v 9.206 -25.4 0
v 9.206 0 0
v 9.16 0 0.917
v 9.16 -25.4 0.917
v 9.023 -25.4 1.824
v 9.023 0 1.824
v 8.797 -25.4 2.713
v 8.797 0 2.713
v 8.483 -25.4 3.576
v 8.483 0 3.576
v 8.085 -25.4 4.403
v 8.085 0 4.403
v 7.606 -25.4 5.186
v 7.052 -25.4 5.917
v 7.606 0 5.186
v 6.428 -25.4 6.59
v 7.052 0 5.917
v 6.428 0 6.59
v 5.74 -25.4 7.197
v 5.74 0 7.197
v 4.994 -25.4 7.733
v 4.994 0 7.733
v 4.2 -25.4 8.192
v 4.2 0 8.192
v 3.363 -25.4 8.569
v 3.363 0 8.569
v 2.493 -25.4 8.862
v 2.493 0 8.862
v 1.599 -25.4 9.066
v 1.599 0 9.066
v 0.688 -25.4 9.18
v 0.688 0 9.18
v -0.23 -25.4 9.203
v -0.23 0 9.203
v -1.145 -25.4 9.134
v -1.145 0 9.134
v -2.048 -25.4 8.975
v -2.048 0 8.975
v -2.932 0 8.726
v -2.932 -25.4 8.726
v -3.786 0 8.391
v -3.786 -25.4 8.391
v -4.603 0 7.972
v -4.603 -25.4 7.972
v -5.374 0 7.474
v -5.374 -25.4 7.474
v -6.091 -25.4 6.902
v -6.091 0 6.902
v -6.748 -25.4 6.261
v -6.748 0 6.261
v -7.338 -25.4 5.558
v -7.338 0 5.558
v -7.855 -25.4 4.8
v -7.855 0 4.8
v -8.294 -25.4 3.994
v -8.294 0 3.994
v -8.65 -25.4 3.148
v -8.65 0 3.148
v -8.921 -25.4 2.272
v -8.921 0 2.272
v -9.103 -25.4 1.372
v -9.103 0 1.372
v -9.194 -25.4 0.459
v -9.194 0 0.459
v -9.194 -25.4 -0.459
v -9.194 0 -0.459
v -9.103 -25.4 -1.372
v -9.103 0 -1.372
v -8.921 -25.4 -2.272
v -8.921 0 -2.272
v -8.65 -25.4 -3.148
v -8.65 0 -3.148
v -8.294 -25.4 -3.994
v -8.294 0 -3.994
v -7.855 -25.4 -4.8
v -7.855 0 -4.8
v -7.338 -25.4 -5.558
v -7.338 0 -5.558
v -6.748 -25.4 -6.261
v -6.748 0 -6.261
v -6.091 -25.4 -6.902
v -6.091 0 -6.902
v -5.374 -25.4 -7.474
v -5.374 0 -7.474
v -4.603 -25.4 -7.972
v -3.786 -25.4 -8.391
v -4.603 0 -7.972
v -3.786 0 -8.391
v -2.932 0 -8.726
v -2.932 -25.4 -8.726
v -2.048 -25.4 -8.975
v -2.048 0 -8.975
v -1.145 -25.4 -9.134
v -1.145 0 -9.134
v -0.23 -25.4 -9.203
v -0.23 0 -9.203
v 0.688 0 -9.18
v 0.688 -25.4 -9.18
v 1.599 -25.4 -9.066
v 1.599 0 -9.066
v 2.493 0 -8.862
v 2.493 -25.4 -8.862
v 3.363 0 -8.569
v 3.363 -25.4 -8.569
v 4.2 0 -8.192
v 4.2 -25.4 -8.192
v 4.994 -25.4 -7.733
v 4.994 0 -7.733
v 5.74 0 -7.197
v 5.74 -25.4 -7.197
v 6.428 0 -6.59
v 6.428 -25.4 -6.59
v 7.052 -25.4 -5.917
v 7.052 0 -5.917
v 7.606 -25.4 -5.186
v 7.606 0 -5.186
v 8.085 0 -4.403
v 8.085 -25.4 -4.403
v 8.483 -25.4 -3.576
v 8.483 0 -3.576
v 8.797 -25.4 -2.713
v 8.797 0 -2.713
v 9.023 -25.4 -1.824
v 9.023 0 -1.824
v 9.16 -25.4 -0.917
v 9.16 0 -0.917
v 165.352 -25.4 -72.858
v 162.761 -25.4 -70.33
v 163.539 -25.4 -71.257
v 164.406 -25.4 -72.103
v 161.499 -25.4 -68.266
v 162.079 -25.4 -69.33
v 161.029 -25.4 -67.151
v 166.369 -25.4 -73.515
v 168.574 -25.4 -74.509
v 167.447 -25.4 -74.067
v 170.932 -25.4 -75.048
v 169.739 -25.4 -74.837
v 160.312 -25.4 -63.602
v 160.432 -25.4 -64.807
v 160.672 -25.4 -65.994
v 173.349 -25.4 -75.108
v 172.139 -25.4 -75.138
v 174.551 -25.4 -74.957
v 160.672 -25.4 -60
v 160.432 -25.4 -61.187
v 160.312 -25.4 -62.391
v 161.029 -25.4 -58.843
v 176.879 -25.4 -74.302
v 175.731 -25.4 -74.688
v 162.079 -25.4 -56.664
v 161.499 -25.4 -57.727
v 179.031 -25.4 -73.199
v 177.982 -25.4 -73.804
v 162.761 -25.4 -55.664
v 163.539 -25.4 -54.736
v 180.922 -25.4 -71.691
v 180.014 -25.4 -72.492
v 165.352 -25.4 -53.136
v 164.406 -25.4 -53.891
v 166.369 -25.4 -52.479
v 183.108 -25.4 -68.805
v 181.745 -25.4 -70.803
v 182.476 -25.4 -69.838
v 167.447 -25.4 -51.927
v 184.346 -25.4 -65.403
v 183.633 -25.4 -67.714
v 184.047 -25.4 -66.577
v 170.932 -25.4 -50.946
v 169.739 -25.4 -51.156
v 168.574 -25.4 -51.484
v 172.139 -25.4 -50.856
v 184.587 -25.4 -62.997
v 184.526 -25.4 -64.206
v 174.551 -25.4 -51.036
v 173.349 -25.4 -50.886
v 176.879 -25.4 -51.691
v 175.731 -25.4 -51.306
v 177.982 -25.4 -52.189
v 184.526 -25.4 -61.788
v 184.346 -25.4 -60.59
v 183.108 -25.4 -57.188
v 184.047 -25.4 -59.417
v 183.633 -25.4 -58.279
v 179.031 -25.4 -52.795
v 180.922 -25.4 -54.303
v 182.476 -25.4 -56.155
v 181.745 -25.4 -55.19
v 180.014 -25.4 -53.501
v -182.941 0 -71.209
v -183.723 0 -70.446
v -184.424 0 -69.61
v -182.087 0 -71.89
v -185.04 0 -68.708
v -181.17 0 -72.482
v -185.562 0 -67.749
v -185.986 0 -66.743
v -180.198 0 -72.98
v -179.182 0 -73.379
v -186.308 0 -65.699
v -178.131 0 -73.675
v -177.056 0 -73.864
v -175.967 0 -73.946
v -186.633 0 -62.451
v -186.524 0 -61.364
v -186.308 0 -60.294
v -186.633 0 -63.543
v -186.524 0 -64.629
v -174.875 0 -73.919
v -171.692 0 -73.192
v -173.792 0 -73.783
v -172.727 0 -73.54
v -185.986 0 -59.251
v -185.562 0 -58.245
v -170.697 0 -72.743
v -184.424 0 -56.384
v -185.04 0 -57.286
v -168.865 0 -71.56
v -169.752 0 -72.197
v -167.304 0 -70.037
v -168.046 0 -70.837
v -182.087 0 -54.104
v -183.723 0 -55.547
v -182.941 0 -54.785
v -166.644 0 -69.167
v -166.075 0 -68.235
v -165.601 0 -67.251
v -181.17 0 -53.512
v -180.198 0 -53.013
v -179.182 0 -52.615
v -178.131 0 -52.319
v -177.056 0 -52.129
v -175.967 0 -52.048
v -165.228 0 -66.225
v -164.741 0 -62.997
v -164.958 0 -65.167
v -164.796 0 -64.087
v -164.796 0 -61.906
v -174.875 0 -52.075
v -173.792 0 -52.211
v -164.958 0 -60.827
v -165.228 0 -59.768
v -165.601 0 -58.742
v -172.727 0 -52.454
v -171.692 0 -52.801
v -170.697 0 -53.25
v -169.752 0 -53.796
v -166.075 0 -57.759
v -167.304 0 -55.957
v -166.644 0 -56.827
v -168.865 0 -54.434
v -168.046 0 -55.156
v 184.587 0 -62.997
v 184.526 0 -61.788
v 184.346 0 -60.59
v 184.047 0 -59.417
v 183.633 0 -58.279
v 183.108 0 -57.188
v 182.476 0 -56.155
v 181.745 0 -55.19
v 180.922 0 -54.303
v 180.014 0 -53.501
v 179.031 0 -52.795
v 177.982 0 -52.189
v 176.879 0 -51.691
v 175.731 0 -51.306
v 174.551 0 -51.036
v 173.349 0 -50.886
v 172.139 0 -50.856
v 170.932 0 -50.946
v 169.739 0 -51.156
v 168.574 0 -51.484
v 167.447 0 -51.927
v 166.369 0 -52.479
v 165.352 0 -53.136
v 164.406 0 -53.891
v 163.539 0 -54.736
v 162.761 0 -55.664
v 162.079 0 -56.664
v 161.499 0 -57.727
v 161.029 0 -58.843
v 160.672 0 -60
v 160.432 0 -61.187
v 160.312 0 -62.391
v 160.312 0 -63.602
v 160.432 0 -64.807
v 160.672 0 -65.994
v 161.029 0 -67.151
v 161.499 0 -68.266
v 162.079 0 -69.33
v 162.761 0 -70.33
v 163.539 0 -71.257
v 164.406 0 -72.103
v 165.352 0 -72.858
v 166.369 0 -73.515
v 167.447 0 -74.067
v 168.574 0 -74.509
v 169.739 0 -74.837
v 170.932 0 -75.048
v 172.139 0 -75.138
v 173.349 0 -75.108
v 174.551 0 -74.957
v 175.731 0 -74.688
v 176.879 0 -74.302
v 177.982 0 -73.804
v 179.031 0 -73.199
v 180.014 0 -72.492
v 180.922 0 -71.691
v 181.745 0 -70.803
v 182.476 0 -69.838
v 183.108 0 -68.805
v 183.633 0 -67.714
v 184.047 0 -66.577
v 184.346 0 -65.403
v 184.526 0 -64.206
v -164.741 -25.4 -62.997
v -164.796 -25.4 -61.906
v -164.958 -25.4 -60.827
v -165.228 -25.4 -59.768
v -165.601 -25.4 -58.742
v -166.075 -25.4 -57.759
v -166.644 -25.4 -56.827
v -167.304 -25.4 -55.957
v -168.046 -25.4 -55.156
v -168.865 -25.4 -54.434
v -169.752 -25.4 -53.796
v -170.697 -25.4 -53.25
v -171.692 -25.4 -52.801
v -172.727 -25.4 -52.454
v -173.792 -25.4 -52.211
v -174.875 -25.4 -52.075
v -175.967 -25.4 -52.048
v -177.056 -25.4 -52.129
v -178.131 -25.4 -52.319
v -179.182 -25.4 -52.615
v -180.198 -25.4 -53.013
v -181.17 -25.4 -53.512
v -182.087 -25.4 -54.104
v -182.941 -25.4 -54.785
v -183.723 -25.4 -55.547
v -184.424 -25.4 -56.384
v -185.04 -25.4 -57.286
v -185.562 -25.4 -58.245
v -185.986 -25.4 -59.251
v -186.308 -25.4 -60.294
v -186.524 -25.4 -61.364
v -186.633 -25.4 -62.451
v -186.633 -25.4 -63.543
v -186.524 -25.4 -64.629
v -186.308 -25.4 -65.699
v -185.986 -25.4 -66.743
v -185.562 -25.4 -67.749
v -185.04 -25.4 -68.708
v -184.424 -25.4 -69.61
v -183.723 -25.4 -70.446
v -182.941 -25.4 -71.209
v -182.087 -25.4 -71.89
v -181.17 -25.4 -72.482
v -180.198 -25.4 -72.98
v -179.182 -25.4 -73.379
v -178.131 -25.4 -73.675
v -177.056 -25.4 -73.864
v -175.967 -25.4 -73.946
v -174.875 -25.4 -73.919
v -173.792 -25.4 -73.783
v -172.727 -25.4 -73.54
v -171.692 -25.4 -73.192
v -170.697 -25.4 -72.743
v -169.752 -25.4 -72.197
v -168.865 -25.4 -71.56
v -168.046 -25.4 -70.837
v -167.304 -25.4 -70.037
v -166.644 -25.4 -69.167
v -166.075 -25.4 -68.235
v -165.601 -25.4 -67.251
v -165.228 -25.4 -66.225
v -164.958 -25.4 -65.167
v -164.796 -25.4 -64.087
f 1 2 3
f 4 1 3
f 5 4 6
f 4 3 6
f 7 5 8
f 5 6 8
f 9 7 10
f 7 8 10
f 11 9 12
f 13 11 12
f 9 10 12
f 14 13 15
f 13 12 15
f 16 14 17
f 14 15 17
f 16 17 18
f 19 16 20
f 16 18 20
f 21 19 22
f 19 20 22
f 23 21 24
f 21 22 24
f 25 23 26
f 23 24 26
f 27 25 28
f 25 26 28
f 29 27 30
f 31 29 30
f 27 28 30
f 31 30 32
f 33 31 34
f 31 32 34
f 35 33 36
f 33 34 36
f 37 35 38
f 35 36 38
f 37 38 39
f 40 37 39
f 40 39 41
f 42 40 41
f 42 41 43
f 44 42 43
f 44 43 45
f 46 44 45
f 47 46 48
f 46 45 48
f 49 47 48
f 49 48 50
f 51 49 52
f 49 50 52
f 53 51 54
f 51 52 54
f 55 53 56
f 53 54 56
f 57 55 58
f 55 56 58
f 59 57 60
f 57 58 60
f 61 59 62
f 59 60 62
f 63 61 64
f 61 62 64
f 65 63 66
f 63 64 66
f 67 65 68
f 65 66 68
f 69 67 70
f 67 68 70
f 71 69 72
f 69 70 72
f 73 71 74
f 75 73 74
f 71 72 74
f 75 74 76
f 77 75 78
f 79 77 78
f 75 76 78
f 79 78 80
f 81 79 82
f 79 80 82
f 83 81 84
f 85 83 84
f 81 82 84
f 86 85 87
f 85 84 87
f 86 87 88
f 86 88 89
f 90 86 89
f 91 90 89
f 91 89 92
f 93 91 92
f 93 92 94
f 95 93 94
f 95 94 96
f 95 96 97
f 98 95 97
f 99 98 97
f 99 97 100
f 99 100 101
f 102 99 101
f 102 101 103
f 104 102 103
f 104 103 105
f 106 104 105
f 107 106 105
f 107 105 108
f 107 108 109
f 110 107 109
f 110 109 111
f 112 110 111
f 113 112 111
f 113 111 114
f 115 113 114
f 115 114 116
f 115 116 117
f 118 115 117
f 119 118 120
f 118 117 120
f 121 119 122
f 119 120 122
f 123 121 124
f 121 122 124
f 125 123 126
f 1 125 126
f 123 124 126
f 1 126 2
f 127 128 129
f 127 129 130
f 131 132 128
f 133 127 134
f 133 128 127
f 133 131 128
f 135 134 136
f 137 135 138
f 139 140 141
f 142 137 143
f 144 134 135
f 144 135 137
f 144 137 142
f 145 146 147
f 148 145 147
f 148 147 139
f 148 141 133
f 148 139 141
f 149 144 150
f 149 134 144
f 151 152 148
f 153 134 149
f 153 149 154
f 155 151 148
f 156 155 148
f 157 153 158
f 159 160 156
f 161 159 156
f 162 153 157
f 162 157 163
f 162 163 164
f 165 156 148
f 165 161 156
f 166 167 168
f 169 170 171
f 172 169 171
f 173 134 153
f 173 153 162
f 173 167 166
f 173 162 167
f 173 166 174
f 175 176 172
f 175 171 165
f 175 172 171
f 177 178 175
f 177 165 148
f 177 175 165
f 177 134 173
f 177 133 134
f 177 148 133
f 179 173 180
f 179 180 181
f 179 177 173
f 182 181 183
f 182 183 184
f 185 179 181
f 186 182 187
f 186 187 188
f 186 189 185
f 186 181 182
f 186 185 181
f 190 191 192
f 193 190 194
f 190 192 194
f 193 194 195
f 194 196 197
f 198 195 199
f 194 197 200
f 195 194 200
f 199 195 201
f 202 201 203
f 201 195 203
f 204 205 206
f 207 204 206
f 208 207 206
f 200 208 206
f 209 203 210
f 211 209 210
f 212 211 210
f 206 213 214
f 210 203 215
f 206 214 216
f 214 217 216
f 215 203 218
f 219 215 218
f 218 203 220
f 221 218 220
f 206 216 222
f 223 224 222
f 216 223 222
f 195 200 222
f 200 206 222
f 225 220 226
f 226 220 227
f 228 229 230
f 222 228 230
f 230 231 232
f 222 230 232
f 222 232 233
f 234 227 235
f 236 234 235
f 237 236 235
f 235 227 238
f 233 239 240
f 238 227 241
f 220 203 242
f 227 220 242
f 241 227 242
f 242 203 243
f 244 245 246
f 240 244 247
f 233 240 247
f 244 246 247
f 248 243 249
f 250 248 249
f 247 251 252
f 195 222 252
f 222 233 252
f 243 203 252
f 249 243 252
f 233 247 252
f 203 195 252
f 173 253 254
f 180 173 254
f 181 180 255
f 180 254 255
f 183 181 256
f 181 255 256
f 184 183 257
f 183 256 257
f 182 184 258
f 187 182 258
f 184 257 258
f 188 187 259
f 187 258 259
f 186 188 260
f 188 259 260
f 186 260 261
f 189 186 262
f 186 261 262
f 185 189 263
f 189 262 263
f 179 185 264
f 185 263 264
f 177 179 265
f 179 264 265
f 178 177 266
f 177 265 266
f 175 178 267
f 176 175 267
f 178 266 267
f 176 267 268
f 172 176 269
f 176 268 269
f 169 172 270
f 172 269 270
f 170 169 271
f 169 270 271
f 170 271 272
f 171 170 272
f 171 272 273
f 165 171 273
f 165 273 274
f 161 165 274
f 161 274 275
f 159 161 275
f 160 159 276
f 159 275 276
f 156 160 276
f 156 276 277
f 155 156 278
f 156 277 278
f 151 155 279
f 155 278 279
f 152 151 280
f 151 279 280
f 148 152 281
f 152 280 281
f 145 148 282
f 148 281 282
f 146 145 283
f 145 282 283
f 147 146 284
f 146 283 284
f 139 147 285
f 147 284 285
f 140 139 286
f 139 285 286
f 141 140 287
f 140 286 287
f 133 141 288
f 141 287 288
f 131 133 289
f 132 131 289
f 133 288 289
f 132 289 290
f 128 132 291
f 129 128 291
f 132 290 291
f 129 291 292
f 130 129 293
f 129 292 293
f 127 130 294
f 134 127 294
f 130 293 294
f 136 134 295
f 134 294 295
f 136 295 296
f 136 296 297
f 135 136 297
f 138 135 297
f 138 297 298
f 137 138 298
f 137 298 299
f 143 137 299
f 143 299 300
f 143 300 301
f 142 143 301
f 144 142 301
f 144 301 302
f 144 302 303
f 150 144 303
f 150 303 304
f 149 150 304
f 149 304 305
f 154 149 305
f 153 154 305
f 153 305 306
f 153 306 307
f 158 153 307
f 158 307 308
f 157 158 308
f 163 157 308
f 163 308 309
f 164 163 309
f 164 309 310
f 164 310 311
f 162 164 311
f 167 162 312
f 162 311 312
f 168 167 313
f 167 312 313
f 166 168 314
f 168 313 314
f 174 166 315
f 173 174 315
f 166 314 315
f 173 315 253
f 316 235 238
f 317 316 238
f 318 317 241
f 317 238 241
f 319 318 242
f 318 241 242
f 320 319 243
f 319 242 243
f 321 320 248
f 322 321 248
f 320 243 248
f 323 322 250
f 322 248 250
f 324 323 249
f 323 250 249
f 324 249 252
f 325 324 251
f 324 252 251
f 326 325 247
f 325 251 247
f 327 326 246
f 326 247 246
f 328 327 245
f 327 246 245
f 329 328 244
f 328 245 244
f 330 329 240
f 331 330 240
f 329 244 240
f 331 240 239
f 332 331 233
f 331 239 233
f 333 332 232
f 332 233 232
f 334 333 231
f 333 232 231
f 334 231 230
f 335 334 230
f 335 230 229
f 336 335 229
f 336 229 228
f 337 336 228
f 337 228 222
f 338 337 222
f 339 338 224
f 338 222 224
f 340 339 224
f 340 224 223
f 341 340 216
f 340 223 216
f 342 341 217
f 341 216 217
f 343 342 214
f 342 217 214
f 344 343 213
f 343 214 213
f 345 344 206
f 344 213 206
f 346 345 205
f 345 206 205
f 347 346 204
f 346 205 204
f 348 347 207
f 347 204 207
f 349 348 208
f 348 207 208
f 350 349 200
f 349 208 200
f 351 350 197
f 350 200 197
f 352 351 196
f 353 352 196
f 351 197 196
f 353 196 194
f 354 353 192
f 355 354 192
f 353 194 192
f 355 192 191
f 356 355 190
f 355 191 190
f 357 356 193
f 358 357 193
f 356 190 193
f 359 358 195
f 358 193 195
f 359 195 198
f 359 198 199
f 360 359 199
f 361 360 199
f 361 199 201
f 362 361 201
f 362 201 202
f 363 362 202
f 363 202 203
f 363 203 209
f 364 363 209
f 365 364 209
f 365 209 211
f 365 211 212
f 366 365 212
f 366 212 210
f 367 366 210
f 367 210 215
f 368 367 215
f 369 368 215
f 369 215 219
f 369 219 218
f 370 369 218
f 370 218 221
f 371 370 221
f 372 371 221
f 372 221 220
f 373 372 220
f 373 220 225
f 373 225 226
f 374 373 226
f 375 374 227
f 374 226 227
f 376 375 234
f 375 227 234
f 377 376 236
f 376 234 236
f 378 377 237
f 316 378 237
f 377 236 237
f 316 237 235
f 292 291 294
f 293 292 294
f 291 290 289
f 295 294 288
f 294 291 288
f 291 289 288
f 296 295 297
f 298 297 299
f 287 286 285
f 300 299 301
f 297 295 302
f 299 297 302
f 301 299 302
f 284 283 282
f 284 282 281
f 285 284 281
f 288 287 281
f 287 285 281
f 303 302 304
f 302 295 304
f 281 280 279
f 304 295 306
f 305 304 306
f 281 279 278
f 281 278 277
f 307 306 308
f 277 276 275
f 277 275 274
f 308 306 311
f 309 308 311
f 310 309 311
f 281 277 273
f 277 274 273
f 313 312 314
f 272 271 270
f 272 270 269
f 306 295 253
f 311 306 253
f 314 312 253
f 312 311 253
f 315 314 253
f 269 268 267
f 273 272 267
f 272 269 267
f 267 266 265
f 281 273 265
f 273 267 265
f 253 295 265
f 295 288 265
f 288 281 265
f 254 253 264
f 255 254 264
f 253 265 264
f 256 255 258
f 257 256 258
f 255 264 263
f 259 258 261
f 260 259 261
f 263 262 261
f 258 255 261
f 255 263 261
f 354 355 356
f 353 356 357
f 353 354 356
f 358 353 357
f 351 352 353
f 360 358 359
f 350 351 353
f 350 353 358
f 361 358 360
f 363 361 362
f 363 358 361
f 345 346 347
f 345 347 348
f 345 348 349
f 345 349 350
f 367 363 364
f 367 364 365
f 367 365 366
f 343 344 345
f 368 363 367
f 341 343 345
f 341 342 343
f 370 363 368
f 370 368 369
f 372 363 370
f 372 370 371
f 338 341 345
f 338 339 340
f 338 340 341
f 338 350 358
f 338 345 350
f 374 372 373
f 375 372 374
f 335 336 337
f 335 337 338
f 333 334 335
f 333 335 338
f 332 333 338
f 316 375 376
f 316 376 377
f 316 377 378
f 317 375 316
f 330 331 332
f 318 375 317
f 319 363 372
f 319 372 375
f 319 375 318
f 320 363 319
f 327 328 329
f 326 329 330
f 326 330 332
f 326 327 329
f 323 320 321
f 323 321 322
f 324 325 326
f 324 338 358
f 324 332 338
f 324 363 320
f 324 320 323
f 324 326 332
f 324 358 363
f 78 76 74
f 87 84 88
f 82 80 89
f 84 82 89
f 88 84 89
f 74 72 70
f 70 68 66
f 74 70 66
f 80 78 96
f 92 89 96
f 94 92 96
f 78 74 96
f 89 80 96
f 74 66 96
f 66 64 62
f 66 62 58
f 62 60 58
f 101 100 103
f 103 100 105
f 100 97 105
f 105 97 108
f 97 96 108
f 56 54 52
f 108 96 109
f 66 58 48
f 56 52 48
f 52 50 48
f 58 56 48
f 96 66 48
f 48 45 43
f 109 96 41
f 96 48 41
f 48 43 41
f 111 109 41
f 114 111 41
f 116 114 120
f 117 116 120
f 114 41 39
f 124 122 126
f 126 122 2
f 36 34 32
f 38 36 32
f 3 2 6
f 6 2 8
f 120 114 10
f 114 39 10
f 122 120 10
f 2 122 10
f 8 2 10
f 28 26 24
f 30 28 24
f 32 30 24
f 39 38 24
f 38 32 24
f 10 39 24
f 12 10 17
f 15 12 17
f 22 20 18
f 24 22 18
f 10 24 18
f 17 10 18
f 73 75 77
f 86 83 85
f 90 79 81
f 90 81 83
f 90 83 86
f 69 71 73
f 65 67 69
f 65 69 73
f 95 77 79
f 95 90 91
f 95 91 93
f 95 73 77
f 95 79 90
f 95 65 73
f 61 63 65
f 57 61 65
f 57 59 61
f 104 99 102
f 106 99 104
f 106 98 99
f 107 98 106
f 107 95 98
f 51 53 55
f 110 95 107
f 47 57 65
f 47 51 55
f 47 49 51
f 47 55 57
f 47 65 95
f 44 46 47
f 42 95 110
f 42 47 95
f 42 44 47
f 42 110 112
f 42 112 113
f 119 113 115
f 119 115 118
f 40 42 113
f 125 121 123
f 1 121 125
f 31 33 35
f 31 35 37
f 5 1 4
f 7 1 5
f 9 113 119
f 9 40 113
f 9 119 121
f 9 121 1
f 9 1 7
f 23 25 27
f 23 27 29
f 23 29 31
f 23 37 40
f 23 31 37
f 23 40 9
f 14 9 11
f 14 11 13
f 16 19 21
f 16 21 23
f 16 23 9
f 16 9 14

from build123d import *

# Parameters (mm, degrees)
F0_R     = 9.205578
F0_R_2   = 10.952577
F0_R_3   = 12.144985
F1_DEPTH = 25.4


with BuildPart() as f1:
    # F0 (on Front) → F1 (new body)
    with BuildSketch(Plane.XZ):
        Circle(F0_R)
        with Locations((-175.69378, -62.996812)):
            Circle(F0_R_2)
        with Locations((172.441736, -62.996812)):
            Circle(F0_R_3)
    extrude(amount=F1_DEPTH)


solid = f1.part
